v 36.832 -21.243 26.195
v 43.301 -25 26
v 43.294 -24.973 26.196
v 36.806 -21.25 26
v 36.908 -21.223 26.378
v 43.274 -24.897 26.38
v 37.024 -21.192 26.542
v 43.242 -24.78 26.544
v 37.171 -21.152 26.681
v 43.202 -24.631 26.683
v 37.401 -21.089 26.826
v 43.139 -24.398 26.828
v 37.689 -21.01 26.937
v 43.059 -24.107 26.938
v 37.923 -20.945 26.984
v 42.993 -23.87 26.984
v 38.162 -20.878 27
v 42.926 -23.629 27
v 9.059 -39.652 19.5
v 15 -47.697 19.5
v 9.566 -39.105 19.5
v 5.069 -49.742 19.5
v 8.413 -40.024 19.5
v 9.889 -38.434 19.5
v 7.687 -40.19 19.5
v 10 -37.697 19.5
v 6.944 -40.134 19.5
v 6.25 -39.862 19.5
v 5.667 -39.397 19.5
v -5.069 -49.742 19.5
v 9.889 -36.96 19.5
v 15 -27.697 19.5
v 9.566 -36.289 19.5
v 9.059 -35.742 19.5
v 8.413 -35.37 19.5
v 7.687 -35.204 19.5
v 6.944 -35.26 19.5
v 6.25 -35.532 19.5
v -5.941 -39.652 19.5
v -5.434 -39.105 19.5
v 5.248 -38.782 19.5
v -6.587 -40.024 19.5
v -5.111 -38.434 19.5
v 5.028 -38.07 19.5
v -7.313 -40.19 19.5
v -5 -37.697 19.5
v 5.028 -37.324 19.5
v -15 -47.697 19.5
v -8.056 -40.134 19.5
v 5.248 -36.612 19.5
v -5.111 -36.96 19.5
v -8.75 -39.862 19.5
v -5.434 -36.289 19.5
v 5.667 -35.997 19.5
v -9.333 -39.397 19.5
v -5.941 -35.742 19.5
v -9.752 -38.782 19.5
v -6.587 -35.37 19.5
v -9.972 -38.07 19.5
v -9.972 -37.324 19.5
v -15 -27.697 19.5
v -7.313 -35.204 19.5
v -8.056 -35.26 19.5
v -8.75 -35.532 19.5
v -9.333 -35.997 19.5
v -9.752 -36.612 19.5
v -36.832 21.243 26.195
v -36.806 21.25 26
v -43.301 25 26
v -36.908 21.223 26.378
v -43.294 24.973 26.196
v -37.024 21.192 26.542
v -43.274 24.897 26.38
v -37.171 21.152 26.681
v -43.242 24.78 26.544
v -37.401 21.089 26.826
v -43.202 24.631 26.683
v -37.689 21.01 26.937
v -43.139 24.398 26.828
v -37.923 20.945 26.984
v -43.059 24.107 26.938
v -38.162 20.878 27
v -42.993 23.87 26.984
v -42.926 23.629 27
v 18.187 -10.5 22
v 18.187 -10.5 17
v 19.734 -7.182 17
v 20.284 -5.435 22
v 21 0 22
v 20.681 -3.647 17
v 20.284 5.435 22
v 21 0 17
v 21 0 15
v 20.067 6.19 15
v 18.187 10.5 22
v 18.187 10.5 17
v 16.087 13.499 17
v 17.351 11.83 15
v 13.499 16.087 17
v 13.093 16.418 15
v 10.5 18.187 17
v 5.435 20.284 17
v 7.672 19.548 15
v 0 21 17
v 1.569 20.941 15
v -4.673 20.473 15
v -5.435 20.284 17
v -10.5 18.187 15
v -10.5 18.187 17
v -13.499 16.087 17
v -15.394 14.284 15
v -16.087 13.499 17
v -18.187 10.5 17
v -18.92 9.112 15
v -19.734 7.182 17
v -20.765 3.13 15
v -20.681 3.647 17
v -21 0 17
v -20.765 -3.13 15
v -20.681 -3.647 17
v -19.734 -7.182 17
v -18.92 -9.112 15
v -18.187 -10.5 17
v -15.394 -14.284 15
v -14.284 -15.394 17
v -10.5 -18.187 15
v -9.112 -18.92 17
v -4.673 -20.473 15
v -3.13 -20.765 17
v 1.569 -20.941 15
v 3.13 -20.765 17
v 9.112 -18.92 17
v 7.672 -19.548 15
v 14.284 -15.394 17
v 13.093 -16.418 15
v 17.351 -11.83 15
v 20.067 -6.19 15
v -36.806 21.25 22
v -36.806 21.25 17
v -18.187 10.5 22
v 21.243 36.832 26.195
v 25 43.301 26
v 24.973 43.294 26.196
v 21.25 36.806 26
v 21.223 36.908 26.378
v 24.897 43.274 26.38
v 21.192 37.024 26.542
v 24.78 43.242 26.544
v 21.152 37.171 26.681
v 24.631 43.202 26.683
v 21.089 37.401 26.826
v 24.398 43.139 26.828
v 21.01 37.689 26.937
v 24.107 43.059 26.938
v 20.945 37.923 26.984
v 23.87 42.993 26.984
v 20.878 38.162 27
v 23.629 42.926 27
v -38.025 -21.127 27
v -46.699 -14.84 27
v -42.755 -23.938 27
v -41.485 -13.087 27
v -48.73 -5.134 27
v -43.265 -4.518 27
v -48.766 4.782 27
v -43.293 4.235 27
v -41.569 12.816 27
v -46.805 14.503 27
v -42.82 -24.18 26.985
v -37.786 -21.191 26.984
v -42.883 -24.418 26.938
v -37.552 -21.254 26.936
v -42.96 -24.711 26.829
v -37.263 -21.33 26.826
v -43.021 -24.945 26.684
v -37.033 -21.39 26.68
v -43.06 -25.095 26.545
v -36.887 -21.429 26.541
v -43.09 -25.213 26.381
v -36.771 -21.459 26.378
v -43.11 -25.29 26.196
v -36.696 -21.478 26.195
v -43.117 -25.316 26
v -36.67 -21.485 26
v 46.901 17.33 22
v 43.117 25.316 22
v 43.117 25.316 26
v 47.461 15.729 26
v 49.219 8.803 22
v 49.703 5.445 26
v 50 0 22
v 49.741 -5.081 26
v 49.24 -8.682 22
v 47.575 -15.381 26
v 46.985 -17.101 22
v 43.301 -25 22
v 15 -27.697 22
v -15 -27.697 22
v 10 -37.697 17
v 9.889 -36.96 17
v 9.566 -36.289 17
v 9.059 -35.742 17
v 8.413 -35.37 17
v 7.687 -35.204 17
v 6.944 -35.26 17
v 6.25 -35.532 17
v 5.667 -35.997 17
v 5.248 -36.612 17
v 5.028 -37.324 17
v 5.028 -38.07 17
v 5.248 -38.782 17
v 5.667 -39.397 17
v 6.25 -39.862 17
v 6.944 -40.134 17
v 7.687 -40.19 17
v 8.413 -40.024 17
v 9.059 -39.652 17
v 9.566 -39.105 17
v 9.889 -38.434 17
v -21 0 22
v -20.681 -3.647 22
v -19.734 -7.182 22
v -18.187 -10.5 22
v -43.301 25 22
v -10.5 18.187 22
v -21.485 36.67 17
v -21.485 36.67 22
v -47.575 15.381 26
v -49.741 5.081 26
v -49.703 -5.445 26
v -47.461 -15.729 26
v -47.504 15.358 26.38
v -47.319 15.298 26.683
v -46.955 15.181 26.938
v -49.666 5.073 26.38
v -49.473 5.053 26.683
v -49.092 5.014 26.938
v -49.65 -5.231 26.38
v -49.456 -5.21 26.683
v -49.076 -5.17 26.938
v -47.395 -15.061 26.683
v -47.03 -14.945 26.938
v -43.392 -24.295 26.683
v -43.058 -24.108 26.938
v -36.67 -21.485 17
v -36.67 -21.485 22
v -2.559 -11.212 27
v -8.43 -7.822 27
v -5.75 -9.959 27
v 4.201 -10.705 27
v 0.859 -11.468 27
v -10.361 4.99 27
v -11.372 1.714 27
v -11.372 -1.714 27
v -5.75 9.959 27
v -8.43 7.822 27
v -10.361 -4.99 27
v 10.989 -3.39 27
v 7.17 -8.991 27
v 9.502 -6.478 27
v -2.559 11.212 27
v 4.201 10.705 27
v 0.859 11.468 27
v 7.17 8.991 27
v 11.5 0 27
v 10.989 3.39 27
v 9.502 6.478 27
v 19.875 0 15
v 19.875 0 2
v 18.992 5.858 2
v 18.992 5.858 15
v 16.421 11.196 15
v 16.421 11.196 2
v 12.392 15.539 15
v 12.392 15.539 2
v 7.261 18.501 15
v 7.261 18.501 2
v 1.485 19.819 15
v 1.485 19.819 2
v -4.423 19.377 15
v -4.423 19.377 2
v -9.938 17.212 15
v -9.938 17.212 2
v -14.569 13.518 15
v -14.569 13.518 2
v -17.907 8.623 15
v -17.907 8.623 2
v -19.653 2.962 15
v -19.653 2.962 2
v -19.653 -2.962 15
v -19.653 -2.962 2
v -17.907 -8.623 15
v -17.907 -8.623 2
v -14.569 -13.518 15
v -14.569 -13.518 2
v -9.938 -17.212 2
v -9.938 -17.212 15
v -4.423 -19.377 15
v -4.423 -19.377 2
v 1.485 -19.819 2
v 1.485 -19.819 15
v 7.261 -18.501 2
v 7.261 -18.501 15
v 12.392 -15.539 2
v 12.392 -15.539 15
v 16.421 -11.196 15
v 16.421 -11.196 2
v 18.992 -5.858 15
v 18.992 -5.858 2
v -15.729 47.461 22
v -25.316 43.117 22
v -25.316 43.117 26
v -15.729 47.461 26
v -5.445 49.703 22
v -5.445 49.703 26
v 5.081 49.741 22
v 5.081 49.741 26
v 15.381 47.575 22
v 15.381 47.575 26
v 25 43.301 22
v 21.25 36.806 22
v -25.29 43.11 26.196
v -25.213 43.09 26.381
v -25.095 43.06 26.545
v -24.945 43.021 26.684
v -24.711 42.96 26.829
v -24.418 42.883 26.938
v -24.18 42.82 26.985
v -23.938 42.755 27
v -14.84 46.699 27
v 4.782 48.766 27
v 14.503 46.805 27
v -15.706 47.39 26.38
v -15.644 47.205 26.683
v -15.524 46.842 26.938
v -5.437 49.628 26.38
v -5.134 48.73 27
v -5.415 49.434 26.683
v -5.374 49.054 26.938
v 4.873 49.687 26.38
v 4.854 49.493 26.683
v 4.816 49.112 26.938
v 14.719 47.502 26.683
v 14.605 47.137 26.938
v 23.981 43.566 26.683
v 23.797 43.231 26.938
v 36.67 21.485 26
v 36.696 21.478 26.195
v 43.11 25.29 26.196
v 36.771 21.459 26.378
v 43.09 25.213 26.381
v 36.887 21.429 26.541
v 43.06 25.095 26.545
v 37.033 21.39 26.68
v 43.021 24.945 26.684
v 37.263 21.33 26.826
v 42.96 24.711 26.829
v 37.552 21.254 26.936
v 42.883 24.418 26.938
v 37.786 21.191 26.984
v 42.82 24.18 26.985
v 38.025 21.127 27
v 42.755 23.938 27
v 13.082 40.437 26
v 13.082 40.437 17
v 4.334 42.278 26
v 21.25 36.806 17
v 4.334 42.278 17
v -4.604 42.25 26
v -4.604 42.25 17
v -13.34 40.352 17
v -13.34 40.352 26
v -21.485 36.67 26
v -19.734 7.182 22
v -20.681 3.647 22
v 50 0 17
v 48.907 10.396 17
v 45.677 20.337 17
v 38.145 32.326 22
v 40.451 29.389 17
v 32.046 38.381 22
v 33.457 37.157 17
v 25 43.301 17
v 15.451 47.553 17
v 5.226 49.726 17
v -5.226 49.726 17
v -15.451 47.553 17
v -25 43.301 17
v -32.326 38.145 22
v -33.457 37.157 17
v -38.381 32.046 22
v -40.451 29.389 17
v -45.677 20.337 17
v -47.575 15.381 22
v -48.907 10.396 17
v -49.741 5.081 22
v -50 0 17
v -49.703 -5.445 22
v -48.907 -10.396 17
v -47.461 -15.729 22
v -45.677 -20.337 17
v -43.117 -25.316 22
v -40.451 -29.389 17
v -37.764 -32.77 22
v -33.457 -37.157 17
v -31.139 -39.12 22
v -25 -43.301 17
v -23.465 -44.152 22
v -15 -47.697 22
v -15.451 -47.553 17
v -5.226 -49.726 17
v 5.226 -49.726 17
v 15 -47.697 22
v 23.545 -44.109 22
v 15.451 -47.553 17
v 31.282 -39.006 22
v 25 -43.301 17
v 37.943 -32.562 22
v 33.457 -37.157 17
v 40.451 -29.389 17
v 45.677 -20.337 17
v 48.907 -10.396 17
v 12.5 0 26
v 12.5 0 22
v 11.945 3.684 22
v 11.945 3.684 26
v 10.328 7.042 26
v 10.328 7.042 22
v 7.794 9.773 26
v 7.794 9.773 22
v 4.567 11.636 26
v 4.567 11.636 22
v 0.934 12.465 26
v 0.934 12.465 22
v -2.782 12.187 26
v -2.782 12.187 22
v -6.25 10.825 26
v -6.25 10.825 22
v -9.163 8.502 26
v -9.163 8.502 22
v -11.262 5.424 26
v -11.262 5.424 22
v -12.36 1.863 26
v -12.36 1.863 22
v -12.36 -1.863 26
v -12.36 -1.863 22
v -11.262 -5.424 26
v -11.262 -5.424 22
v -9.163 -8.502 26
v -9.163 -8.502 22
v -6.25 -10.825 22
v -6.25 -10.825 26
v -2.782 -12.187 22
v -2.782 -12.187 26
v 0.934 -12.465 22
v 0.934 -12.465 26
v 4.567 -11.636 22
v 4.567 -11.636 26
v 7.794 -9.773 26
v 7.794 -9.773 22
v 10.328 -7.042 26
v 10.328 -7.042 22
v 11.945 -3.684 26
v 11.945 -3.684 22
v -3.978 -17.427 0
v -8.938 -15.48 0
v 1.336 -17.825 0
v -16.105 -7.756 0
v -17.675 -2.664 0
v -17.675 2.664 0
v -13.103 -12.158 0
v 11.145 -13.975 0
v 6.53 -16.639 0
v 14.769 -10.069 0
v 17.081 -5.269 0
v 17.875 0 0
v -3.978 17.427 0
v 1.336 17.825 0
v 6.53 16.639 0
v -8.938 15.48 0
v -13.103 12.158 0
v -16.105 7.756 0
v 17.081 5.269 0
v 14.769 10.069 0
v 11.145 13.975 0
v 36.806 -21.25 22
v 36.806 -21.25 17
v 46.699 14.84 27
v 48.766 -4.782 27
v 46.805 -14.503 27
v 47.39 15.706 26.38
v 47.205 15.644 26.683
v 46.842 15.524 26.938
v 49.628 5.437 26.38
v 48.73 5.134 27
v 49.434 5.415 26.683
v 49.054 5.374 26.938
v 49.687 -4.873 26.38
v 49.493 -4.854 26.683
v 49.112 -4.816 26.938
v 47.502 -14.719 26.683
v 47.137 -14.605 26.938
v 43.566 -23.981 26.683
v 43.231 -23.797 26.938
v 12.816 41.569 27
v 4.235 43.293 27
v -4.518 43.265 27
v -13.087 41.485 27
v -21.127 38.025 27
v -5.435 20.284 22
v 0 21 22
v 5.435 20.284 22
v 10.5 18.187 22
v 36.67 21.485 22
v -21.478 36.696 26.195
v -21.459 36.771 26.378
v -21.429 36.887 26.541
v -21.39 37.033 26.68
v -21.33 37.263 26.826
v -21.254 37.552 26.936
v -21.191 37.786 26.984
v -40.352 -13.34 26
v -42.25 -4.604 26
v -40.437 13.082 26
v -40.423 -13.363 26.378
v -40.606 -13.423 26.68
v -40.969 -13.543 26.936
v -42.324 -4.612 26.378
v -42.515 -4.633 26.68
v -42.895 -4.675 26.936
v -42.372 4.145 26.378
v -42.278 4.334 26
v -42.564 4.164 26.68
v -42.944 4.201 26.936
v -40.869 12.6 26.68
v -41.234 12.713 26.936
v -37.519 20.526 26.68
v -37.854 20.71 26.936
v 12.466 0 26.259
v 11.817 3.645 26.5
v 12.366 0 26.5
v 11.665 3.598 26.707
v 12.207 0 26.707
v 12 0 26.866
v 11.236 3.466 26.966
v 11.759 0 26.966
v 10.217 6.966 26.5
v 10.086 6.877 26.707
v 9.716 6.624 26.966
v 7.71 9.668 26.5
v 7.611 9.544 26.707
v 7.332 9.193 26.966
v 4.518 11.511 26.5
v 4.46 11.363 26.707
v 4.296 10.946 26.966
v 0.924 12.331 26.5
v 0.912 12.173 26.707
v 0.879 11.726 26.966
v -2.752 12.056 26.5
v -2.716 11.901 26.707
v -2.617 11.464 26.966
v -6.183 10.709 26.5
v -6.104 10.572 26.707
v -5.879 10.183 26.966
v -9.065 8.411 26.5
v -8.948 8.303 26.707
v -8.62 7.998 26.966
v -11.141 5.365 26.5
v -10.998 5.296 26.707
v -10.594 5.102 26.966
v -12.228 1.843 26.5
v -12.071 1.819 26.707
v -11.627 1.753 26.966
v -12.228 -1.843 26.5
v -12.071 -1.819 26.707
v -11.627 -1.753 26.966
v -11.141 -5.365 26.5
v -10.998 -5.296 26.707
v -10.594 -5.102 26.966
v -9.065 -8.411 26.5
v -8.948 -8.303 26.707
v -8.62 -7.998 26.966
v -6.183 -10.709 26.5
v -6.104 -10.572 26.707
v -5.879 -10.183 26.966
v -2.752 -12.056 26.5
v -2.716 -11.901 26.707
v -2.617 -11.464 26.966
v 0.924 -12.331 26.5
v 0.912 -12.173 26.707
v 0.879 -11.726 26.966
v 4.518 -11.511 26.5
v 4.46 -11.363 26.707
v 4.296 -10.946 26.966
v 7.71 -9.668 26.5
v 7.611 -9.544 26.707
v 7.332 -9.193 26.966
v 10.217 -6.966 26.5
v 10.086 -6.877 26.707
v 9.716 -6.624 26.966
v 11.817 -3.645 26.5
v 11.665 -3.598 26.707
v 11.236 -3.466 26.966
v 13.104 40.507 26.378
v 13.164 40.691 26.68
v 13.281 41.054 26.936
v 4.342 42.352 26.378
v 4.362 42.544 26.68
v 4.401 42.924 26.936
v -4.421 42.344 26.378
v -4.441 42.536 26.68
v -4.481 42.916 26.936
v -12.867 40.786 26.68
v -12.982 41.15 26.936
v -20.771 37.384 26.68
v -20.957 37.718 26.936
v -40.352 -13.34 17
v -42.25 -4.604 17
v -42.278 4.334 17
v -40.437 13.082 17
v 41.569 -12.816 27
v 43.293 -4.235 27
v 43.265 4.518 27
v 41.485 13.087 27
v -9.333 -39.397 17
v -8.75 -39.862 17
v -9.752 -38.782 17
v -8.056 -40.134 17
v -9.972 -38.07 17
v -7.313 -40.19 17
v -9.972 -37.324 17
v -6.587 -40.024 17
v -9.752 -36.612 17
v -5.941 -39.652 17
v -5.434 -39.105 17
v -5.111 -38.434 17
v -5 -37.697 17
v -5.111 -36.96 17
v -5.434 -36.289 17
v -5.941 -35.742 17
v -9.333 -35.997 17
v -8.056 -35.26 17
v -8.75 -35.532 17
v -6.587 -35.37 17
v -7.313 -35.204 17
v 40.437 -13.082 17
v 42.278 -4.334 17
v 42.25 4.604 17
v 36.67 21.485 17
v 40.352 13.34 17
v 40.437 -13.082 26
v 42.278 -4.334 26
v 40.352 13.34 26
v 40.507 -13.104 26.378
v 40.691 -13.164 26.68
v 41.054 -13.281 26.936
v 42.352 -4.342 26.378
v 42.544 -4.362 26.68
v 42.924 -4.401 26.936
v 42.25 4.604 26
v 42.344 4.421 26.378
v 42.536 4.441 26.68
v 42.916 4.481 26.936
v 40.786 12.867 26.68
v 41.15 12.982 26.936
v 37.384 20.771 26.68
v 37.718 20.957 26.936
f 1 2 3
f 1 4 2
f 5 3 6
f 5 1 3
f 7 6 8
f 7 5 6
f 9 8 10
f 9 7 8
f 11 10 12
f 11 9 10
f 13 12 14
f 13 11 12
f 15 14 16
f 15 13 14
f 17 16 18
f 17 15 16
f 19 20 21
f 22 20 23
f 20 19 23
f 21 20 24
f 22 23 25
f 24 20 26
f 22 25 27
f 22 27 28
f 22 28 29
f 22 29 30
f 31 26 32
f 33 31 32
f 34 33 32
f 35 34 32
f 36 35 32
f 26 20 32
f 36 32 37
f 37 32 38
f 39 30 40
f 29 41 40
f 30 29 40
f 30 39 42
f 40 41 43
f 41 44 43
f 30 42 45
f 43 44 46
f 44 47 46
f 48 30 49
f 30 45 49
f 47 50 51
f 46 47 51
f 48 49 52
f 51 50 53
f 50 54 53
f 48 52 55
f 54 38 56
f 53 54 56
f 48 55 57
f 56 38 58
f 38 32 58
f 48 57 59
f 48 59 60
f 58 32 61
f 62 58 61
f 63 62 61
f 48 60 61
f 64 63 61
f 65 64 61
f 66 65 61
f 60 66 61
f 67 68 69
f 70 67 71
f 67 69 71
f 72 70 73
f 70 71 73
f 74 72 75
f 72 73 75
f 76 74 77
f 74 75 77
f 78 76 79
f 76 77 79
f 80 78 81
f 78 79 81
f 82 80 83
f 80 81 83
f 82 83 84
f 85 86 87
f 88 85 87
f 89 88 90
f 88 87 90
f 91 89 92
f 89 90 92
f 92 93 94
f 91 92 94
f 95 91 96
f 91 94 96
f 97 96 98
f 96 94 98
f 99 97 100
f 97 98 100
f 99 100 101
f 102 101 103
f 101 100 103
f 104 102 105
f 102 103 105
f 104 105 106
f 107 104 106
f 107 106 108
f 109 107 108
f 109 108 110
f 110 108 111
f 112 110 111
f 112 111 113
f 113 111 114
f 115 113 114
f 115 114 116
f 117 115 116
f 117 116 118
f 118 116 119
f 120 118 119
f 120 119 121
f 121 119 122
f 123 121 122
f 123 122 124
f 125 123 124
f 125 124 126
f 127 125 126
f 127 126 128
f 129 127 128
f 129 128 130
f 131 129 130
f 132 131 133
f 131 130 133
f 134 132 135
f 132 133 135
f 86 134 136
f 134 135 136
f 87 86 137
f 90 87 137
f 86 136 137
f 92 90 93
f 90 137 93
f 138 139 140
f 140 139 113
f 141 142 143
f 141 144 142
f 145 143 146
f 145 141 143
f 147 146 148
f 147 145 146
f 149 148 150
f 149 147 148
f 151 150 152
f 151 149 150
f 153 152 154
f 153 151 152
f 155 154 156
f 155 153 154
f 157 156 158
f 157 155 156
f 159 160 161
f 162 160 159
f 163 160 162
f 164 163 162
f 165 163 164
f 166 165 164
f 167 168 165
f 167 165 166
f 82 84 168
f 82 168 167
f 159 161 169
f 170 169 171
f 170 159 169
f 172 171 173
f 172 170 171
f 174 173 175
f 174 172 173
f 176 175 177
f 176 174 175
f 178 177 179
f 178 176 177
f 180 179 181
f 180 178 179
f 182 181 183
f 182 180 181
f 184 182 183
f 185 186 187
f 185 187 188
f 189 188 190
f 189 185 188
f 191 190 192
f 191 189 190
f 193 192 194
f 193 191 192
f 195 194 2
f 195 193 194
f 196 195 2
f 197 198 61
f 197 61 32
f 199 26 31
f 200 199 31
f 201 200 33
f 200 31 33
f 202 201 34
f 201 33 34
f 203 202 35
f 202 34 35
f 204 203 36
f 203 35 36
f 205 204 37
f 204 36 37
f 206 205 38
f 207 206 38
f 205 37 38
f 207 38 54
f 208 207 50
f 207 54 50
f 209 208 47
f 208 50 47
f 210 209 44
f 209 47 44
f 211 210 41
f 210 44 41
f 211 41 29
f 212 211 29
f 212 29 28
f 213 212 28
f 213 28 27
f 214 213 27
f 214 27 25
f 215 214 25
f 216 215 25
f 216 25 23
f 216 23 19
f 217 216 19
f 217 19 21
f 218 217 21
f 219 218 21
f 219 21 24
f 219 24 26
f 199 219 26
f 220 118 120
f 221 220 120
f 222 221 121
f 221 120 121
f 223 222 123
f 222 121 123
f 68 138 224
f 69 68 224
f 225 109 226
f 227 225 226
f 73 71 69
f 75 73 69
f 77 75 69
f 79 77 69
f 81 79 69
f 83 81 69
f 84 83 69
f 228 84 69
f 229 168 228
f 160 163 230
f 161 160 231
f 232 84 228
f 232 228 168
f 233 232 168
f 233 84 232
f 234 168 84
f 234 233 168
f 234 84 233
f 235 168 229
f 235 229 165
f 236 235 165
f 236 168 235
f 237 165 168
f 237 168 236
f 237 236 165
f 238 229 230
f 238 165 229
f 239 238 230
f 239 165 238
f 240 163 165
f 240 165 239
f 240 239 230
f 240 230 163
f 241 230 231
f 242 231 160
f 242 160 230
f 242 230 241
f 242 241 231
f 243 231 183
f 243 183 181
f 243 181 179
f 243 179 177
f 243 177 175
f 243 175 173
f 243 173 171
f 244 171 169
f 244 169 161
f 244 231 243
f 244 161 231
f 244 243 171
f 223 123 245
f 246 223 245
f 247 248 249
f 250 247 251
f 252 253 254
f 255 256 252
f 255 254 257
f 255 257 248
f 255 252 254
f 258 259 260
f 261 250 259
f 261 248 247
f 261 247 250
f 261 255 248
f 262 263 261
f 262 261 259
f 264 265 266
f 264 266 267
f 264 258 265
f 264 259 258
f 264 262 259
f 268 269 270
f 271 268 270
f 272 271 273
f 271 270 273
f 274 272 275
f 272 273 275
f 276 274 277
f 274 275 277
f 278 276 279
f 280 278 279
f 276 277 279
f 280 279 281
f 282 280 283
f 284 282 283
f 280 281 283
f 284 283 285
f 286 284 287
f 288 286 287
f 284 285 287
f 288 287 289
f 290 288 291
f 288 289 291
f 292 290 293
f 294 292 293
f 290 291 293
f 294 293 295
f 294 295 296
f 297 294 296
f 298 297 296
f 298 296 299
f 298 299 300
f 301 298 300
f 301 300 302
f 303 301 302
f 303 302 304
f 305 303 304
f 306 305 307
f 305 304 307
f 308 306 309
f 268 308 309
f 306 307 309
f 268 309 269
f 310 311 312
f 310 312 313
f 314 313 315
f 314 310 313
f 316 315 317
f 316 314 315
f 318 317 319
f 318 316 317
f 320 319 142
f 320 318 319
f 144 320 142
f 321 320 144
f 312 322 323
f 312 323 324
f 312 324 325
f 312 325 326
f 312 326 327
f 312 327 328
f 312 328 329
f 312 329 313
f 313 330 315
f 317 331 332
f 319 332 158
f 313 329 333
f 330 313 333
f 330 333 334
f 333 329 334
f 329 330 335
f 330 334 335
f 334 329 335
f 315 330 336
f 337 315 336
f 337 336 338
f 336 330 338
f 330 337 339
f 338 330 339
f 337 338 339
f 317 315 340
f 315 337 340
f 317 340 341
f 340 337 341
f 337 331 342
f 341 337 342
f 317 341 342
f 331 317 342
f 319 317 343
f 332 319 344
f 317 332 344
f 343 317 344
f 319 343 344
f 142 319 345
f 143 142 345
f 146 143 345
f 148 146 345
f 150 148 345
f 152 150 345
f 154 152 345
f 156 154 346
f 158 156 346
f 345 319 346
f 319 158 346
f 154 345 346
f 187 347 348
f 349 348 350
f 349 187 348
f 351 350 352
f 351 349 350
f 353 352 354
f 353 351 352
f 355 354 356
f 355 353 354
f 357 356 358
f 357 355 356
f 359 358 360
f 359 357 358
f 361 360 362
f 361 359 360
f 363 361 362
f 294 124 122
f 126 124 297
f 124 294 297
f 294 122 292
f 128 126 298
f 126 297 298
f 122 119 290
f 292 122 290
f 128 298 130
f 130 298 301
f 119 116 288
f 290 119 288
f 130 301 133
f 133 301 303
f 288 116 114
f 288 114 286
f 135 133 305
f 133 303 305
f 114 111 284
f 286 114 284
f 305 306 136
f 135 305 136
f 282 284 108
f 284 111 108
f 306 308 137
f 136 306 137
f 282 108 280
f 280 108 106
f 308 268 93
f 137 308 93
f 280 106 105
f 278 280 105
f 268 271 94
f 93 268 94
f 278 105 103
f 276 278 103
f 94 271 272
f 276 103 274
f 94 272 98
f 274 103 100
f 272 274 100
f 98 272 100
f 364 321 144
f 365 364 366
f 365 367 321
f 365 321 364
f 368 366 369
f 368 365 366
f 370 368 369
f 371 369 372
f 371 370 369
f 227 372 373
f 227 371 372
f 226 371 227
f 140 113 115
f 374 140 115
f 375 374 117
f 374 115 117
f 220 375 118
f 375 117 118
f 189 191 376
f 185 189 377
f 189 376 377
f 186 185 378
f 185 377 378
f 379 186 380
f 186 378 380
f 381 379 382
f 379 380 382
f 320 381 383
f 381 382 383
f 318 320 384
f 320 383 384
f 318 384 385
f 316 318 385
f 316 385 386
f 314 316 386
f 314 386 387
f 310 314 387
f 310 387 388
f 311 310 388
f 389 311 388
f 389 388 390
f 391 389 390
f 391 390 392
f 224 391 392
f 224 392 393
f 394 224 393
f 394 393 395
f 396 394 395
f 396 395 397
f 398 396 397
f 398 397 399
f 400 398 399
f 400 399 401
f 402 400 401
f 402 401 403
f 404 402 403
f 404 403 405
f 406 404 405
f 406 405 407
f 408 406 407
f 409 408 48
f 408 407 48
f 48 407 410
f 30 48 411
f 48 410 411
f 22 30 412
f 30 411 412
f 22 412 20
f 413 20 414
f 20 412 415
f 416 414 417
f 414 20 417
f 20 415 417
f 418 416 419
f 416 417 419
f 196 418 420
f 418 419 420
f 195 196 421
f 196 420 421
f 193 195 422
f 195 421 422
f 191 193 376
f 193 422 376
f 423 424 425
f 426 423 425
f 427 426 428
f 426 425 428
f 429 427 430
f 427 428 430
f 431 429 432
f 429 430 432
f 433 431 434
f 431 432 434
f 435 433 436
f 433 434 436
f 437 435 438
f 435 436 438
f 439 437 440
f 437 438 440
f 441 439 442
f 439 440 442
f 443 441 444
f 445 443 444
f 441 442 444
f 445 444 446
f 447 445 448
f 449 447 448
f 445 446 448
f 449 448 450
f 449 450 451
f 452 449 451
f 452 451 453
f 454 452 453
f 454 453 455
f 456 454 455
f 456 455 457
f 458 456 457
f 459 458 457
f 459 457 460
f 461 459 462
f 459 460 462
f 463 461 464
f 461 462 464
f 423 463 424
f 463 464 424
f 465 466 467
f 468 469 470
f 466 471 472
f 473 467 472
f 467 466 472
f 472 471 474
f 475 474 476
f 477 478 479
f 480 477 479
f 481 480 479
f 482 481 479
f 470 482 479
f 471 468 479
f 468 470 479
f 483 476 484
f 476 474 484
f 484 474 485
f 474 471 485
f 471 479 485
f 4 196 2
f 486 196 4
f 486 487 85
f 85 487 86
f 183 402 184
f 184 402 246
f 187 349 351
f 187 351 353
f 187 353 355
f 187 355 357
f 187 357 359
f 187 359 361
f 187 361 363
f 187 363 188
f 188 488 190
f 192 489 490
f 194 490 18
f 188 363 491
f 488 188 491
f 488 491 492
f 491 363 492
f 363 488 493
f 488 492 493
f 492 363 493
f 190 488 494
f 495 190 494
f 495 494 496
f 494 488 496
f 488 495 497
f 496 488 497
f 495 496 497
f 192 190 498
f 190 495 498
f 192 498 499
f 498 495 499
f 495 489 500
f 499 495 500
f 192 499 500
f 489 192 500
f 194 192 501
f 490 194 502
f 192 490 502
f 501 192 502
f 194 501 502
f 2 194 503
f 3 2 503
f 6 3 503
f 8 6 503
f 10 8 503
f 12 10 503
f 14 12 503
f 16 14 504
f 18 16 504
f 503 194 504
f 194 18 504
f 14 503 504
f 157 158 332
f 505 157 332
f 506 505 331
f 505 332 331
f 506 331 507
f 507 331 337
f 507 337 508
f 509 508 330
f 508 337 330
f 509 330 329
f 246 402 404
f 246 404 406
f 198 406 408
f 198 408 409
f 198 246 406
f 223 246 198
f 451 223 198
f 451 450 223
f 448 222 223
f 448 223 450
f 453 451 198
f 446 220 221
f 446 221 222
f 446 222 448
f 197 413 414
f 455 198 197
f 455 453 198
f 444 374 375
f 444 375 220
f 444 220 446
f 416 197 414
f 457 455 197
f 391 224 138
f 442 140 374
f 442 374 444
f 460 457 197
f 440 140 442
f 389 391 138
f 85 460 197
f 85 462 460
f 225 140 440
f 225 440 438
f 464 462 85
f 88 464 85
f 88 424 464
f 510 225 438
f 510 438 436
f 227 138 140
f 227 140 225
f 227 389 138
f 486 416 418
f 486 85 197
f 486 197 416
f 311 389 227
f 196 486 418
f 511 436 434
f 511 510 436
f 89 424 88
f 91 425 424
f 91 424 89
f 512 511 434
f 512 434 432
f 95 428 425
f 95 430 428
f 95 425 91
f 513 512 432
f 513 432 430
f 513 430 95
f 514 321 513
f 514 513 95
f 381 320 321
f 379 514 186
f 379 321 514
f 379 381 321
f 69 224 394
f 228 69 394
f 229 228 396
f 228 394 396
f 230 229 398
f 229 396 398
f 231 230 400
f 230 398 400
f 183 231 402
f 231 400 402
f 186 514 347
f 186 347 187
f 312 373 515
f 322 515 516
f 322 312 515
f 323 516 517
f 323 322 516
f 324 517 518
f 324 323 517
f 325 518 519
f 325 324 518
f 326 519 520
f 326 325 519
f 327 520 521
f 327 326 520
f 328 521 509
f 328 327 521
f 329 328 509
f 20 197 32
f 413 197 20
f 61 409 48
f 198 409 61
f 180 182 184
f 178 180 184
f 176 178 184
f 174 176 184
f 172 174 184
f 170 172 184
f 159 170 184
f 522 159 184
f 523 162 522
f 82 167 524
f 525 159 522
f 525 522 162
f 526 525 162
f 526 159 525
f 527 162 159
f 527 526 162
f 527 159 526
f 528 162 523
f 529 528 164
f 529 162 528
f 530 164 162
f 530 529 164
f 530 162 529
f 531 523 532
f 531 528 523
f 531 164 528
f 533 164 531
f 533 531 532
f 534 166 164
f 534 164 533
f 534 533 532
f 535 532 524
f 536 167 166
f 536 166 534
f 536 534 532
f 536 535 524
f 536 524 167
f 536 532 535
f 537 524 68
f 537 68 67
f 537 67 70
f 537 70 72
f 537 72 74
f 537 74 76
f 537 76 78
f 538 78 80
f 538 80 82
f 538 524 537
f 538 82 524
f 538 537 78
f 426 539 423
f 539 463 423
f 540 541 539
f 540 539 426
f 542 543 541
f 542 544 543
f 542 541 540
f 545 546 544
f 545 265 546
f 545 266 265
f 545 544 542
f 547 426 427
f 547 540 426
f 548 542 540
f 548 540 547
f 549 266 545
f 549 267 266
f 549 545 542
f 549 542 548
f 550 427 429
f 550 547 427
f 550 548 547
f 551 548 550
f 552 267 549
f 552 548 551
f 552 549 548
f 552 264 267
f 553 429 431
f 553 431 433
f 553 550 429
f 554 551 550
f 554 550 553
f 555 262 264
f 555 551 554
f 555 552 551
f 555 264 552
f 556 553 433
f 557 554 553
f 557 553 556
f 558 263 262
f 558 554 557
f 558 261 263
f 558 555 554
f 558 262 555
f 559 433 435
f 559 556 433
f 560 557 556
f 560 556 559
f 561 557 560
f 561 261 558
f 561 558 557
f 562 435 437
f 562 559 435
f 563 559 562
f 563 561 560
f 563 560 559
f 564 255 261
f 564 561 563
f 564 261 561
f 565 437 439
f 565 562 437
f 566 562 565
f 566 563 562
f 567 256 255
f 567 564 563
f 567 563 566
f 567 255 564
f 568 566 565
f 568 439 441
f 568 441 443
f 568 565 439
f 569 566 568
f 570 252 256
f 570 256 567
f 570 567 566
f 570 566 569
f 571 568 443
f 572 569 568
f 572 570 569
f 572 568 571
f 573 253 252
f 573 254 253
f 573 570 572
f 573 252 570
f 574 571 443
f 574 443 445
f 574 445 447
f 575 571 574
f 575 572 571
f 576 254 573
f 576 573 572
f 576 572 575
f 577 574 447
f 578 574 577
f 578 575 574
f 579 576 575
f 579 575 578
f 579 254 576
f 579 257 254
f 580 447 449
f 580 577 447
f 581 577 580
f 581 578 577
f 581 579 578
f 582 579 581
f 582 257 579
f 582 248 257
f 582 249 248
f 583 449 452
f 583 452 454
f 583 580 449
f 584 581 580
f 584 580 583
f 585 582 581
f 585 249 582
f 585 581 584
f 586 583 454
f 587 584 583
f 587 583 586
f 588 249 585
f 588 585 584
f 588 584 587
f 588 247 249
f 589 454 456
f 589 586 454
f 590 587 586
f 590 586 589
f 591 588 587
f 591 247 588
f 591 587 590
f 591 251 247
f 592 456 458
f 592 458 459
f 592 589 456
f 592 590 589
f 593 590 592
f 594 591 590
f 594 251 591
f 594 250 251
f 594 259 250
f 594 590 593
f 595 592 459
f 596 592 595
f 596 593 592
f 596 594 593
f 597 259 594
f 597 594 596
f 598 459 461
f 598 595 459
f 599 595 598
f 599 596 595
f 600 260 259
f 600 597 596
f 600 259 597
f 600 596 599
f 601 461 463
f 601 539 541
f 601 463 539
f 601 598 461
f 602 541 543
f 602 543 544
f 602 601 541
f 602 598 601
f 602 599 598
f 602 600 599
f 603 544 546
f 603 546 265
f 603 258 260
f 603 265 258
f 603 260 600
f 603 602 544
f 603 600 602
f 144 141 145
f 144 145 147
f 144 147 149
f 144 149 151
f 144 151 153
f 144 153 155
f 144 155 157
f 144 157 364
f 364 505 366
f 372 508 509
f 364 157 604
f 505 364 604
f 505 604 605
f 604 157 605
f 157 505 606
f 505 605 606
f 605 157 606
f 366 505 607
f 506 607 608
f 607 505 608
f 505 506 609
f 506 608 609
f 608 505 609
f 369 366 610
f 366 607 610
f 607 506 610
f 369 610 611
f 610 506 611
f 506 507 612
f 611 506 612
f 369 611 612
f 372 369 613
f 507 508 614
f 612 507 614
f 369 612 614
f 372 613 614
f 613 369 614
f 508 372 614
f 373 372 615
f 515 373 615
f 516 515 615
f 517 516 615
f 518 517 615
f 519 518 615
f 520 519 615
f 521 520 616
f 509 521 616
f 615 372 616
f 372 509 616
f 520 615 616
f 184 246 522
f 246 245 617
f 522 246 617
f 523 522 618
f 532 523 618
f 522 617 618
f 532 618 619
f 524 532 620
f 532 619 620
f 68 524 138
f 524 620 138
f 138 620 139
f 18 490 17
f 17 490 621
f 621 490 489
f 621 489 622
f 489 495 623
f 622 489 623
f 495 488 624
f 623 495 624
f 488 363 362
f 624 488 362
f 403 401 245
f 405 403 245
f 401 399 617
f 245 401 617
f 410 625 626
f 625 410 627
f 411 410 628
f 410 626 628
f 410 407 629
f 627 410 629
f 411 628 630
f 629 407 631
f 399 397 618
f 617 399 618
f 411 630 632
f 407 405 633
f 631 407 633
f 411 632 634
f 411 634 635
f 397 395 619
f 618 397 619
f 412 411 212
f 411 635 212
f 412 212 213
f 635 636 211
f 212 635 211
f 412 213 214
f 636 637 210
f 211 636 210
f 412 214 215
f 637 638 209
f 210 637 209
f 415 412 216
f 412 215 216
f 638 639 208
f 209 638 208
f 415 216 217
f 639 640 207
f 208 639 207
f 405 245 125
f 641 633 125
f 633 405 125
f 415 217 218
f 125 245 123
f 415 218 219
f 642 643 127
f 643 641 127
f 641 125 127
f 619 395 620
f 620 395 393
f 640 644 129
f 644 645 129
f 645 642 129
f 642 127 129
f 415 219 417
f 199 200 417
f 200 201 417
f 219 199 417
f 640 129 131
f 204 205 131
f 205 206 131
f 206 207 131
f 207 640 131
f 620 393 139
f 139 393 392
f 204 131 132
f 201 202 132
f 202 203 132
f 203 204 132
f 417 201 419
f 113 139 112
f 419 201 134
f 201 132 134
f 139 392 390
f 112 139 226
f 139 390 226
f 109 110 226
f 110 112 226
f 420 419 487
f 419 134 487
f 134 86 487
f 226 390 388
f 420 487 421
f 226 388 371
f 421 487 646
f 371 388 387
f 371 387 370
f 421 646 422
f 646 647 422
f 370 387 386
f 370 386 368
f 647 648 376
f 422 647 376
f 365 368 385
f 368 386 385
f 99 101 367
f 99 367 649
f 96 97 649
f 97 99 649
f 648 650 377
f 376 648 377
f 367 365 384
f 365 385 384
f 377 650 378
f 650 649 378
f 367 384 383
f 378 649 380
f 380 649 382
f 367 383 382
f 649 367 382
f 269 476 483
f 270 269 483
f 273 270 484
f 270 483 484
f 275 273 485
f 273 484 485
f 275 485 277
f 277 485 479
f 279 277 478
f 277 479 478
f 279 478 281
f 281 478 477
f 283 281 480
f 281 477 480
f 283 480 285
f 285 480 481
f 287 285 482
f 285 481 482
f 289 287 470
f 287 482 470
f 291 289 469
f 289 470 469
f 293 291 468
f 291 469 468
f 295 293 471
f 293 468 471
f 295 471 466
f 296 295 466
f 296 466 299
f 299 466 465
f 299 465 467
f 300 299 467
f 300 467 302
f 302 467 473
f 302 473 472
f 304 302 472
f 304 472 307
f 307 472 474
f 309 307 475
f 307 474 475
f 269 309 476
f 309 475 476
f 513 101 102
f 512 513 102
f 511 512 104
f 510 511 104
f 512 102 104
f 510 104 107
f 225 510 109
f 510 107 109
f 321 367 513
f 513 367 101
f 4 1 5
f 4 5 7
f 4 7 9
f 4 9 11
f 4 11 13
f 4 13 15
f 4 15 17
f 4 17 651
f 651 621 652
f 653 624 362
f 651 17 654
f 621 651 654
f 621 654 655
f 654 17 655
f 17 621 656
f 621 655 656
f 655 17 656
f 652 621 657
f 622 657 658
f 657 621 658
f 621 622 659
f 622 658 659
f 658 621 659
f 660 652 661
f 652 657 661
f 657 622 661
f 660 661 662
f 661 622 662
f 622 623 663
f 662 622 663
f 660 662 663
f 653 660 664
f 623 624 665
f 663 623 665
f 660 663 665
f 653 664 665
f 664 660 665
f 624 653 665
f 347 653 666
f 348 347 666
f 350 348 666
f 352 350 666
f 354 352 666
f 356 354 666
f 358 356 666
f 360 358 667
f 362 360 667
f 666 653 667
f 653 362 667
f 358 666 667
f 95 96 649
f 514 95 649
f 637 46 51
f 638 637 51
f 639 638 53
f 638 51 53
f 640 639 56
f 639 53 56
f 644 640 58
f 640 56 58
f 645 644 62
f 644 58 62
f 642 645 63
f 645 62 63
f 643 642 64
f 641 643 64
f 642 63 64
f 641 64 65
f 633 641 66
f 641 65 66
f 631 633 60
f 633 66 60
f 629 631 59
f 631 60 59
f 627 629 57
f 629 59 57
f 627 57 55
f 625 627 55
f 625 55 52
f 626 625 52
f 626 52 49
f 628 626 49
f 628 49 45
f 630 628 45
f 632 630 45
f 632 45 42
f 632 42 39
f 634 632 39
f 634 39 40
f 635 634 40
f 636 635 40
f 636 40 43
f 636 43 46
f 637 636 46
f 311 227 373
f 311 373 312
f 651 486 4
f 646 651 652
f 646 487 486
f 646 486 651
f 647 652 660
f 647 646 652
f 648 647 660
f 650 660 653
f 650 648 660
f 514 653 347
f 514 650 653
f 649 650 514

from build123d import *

# Parameters (mm, degrees)
SKETCH1_R           = 19.875
BOSS_EXTRUDE1_DEPTH = 15
SKETCH2_R           = 21
BOSS_EXTRUDE2_DEPTH = 2
SKETCH3_R           = 50
BOSS_EXTRUDE3_DEPTH = 5
CUT_EXTRUDE2_DEPTH  = 5
CUT_EXTRUDE3_DEPTH  = 2.5
SKETCH8_R           = 2.5
CUT_EXTRUDE4_DEPTH  = 20.5
BOSS_EXTRUDE4_DEPTH = 5
FILLET1_R           = 1
CHAMFER1_SIZE       = 2
SKETCH10_R          = 12.5
BOSS_EXTRUDE5_DEPTH = 5
FILLET2_R           = 1


with BuildPart() as part:
    # Sketch1 → Boss-Extrude1 (new body)
    with BuildSketch(Plane.XY):
        Circle(SKETCH1_R)
    extrude(amount=BOSS_EXTRUDE1_DEPTH)

    # Sketch2 → Boss-Extrude2 (add)
    with BuildSketch(Plane.XY.offset(15)):
        Circle(SKETCH2_R)
    extrude(amount=BOSS_EXTRUDE2_DEPTH)

    # Sketch3 → Boss-Extrude3 (add)
    with BuildSketch(Plane.XY.offset(17)):
        Circle(SKETCH3_R)
    extrude(amount=BOSS_EXTRUDE3_DEPTH)

    # Sketch4 → Cut-Extrude2 (cut)
    with BuildSketch(Plane(origin=(0, 0, 17), x_dir=(-1, 0, 0), z_dir=(0, 0, -1))):
        with BuildLine():
            ThreePointArc((-18.186533479, -10.5), (-21, 0), (-18.186533479, 10.5))
            Line((-18.186533479, 10.5), (-36.669606346, 21.484644991))
            ThreePointArc((-36.669606346, 21.484644991), (-42.499783284, 0.135723282), (-36.806079661, -21.25))
            Line((-36.806079661, -21.25), (-18.186533479, -10.5))
        make_face()
        with BuildLine():
            Line((-21.25, 36.806079661), (-10.5, 18.186533479))
            ThreePointArc((-10.5, 18.186533479), (0, 21), (10.5, 18.186533479))
            Line((10.5, 18.186533479), (21.484644991, 36.669606346))
            ThreePointArc((21.484644991, 36.669606346), (0.135723282, 42.499783284), (-21.25, 36.806079661))
        make_face()
        with BuildLine():
            Line((36.806079661, 21.25), (18.186533479, 10.5))
            ThreePointArc((18.186533479, 10.5), (20.284442352, 5.435199947), (21, 0))
            ThreePointArc((21, 0), (20.284442352, -5.435199947), (18.186533479, -10.5))
            Line((18.186533479, -10.5), (36.669606346, -21.484644991))
            ThreePointArc((36.669606346, -21.484644991), (42.499783284, -0.135723282), (36.806079661, 21.25))
        make_face()
    extrude(amount=-CUT_EXTRUDE2_DEPTH, mode=Mode.SUBTRACT)

    # Sketch5 → Cut-Extrude3 (cut)
    with BuildSketch(Plane.XY.offset(22)):
        with BuildLine():
            Line((-15, -47.696960071), (-15, -27.696960071))
            Line((-15, -27.696960071), (15, -27.696960071))
            Line((15, -27.696960071), (15, -47.696960071))
            ThreePointArc((15, -47.696960071), (0, -50), (-15, -47.696960071))
        make_face()
    extrude(amount=-CUT_EXTRUDE3_DEPTH, mode=Mode.SUBTRACT)

    # Sketch8 → Cut-Extrude4 (cut, through all)
    with BuildSketch(Plane.XY.offset(19.5)):
        with Locations((-7.5, -37.696960071)):
            Circle(SKETCH8_R)
        with Locations((7.5, -37.696960071)):
            Circle(SKETCH8_R)
    extrude(amount=-CUT_EXTRUDE4_DEPTH, mode=Mode.SUBTRACT)

    # Sketch9 → Boss-Extrude4 (add)
    with BuildSketch(Plane.XY.offset(22)):
        with BuildLine():
            Line((-36.806079661, 21.25), (-43.301270189, 25))
            ThreePointArc((-43.301270189, 25), (-49.999664861, -0.183067825), (-43.117042638, -25.316410373))
            Line((-43.117042638, -25.316410373), (-36.669606346, -21.484644991))
            ThreePointArc((-36.669606346, -21.484644991), (-42.499783284, -0.135723282), (-36.806079661, 21.25))
        make_face()
        with BuildLine():
            Line((-21.484644991, 36.669606346), (-25.316410373, 43.117042638))
            ThreePointArc((-25.316410373, 43.117042638), (-0.183067825, 49.999664861), (25, 43.301270189))
            Line((25, 43.301270189), (21.25, 36.806079661))
            ThreePointArc((21.25, 36.806079661), (-0.135723282, 42.499783284), (-21.484644991, 36.669606346))
        make_face()
        with BuildLine():
            Line((36.669606346, 21.484644991), (43.117042638, 25.316410373))
            ThreePointArc((43.117042638, 25.316410373), (49.999664861, 0.183067825), (43.301270189, -25))
            Line((43.301270189, -25), (36.806079661, -21.25))
            ThreePointArc((36.806079661, -21.25), (42.499783284, 0.135723282), (36.669606346, 21.484644991))
        make_face()
    extrude(amount=BOSS_EXTRUDE4_DEPTH)

    # Fillet1
    fillet1_edges = [part.edges().sort_by_distance(p)[0] for p in [
        (-0.183067825, 49.999664861, 27),
        (-23.400527682, 39.893324492, 27),
        (42.499783284, 0.135723282, 27),
        (40.053674925, -23.125, 27),
        (49.999664861, 0.183067825, 27),
        (39.893324492, 23.400527682, 27),
        (-42.499783284, -0.135723282, 27),
        (-40.053674925, 23.125, 27),
        (-49.999664861, -0.183067825, 27),
        (-39.893324492, -23.400527682, 27),
        (-0.135723282, 42.499783284, 27),
        (23.125, 40.053674925, 27),
    ]]
    fillet(fillet1_edges, radius=FILLET1_R)

    # Chamfer1
    chamfer1_edges = [part.edges().sort_by_distance(p)[0] for p in [
        (-19.875, 0, 0),
    ]]
    chamfer(chamfer1_edges, length=CHAMFER1_SIZE)

    # Sketch10 → Boss-Extrude5 (add)
    with BuildSketch(Plane.XY.offset(22)):
        Circle(SKETCH10_R)
    extrude(amount=BOSS_EXTRUDE5_DEPTH)

    # Fillet2
    fillet2_edges = [part.edges().sort_by_distance(p)[0] for p in [
        (-12.5, 0, 27),
    ]]
    fillet(fillet2_edges, radius=FILLET2_R)


solid = part.part
